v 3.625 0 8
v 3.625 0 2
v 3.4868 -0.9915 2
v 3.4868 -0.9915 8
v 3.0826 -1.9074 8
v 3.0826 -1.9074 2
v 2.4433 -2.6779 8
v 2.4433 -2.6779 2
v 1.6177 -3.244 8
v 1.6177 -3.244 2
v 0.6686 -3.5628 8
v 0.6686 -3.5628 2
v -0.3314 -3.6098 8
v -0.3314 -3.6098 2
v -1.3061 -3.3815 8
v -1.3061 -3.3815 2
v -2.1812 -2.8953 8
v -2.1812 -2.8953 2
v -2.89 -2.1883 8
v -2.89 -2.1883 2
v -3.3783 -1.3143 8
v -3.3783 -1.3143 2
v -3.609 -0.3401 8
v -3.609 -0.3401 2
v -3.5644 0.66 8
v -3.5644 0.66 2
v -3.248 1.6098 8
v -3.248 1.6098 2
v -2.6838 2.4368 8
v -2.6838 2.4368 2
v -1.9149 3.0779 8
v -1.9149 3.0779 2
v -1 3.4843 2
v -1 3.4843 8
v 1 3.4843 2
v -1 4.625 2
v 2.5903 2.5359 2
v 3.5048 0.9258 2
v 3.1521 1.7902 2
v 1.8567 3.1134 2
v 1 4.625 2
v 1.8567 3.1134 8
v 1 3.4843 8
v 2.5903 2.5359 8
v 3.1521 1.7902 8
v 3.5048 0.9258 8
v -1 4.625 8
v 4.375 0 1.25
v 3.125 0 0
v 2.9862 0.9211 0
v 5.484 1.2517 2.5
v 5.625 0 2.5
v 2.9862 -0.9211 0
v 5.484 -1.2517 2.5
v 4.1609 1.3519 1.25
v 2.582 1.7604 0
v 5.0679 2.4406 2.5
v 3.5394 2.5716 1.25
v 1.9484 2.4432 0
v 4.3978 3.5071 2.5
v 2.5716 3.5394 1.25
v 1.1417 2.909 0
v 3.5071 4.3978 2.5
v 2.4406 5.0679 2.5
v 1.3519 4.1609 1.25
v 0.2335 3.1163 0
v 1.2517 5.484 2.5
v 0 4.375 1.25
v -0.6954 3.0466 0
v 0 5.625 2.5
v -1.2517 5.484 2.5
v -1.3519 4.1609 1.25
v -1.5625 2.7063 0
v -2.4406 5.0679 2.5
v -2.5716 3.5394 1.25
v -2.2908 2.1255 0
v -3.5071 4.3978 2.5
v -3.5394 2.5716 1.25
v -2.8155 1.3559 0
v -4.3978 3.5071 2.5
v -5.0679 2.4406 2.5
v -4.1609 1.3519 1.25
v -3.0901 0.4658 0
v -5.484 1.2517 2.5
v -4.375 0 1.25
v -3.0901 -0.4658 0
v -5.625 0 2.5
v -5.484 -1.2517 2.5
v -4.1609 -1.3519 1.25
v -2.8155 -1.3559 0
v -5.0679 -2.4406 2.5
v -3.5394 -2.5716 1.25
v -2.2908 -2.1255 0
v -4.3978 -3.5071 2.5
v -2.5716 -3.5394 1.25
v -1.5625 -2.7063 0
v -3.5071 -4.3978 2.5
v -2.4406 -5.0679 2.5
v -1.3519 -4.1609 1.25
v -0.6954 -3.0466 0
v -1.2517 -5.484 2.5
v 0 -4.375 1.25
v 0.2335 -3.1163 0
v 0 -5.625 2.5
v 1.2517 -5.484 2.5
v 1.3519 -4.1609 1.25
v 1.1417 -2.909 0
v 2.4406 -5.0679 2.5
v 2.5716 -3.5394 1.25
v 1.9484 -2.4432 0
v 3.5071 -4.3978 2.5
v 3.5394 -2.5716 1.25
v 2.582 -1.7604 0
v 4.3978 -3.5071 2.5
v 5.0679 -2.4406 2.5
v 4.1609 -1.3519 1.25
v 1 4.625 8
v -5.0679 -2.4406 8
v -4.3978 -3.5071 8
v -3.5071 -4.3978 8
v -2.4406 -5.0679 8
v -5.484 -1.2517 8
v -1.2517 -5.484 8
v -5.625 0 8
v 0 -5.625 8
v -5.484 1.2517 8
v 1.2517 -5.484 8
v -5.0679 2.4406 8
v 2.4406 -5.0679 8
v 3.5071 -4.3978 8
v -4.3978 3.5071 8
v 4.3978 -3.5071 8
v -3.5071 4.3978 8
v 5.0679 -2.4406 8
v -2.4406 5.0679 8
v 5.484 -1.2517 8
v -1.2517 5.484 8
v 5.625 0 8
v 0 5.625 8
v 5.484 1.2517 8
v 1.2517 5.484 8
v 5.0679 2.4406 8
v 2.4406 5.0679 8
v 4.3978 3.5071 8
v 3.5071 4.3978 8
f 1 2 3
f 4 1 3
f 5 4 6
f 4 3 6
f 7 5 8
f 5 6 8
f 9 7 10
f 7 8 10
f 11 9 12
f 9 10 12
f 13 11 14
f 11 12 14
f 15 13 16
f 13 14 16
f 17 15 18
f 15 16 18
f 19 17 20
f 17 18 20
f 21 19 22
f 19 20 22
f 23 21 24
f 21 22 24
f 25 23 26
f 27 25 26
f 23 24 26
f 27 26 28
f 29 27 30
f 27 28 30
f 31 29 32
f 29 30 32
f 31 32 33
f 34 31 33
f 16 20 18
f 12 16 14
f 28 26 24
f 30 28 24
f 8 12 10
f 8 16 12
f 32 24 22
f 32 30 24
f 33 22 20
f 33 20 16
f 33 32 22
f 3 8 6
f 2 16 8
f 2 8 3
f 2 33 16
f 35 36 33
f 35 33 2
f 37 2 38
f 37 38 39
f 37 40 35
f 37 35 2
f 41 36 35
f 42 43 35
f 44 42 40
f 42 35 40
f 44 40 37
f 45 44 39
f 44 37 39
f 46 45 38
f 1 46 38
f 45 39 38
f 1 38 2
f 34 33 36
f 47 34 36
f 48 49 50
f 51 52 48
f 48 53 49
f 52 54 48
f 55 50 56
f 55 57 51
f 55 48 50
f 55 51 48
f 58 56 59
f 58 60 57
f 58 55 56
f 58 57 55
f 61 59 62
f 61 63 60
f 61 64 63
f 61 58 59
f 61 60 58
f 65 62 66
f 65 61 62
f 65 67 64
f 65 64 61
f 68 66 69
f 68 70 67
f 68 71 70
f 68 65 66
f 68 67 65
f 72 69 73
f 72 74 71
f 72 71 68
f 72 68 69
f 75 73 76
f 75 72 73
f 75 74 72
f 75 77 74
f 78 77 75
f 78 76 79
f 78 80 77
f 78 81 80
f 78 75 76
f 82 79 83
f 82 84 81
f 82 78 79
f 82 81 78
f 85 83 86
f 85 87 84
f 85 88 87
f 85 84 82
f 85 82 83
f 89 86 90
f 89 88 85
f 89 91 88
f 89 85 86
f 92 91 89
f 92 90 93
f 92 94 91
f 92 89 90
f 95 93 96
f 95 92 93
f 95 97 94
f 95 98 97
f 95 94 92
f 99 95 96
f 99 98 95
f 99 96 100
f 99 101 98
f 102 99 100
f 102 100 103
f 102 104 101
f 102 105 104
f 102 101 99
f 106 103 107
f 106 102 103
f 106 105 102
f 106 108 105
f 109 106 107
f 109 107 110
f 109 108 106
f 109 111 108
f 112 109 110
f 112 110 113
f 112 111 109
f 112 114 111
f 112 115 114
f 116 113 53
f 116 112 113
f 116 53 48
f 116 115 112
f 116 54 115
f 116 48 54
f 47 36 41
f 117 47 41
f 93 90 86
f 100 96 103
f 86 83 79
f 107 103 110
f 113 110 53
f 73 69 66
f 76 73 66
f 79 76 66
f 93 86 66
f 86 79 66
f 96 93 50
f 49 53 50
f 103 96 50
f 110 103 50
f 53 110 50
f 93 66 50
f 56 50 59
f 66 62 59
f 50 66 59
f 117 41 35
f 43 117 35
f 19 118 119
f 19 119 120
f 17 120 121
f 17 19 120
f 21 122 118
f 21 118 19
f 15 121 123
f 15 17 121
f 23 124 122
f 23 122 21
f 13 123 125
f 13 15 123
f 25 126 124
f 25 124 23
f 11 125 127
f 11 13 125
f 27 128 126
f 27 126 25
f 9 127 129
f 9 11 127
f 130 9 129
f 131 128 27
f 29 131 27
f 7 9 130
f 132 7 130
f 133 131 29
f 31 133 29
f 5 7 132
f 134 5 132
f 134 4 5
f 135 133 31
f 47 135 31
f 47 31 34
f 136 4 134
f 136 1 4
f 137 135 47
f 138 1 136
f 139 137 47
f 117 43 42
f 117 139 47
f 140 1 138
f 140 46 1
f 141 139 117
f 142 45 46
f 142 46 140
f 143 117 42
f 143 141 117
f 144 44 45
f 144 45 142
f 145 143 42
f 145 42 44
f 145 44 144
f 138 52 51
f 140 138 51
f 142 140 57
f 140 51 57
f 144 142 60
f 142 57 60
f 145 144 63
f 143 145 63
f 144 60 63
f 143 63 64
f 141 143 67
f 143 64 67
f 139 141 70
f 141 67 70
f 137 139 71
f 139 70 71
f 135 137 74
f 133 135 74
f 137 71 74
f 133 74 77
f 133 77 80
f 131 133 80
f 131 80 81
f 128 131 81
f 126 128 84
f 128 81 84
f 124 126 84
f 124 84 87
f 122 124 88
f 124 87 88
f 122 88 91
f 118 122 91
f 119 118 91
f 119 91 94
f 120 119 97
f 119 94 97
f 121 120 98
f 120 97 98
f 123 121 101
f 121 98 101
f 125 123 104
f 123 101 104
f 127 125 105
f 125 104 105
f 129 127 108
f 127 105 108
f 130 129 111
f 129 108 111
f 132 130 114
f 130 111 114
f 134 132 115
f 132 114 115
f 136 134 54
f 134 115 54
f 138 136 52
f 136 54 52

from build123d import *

# Parameters (mm, degrees)
F0_R     = 5.625
F1_DEPTH = 8
F2_DEPTH = 2
F3_SIZE  = 2.5


with BuildPart() as f1:
    # F0 (on Top) → F1 (new body)
    with BuildSketch(Plane.XY):
        Circle(F0_R)
        with BuildLine():
            ThreePointArc((1, 3.48434), (2.895309, 2.181241), (3.625, 0))
            ThreePointArc((3.625, 0), (-2.181241, -2.895309), (-1, 3.48434))
            Line((-1, 3.48434), (-1, 4.625))
            Line((-1, 4.625), (1, 4.625))
            Line((1, 4.625), (1, 3.48434))
        make_face(mode=Mode.SUBTRACT)
    extrude(amount=F1_DEPTH)

    # F0 (on Top) → F2 (join)
    with BuildSketch(Plane.XY):
        with BuildLine():
            ThreePointArc((-1, 3.48434), (-2.181241, -2.895309), (3.625, 0))
            ThreePointArc((3.625, 0), (2.895309, 2.181241), (1, 3.48434))
            Line((1, 3.48434), (1, 2.625))
            Line((1, 2.625), (-1, 2.625))
            Line((-1, 2.625), (-1, 3.48434))
        make_face()
        with BuildLine():
            ThreePointArc((-1, 3.48434), (0, 3.625), (1, 3.48434))
            Line((1, 3.48434), (1, 4.625))
            Line((1, 4.625), (-1, 4.625))
            Line((-1, 4.625), (-1, 3.48434))
        make_face()
        with BuildLine():
            Line((1, 2.625), (1, 3.48434))
            ThreePointArc((1, 3.48434), (0, 3.625), (-1, 3.48434))
            Line((-1, 3.48434), (-1, 2.625))
            Line((-1, 2.625), (1, 2.625))
        make_face()
    extrude(amount=F2_DEPTH)

    # F3
    f3_edges = [f1.edges().sort_by_distance(p)[0] for p in [
        (-5.625, 0, 0),
    ]]
    chamfer(f3_edges, length=F3_SIZE)


solid = f1.part
